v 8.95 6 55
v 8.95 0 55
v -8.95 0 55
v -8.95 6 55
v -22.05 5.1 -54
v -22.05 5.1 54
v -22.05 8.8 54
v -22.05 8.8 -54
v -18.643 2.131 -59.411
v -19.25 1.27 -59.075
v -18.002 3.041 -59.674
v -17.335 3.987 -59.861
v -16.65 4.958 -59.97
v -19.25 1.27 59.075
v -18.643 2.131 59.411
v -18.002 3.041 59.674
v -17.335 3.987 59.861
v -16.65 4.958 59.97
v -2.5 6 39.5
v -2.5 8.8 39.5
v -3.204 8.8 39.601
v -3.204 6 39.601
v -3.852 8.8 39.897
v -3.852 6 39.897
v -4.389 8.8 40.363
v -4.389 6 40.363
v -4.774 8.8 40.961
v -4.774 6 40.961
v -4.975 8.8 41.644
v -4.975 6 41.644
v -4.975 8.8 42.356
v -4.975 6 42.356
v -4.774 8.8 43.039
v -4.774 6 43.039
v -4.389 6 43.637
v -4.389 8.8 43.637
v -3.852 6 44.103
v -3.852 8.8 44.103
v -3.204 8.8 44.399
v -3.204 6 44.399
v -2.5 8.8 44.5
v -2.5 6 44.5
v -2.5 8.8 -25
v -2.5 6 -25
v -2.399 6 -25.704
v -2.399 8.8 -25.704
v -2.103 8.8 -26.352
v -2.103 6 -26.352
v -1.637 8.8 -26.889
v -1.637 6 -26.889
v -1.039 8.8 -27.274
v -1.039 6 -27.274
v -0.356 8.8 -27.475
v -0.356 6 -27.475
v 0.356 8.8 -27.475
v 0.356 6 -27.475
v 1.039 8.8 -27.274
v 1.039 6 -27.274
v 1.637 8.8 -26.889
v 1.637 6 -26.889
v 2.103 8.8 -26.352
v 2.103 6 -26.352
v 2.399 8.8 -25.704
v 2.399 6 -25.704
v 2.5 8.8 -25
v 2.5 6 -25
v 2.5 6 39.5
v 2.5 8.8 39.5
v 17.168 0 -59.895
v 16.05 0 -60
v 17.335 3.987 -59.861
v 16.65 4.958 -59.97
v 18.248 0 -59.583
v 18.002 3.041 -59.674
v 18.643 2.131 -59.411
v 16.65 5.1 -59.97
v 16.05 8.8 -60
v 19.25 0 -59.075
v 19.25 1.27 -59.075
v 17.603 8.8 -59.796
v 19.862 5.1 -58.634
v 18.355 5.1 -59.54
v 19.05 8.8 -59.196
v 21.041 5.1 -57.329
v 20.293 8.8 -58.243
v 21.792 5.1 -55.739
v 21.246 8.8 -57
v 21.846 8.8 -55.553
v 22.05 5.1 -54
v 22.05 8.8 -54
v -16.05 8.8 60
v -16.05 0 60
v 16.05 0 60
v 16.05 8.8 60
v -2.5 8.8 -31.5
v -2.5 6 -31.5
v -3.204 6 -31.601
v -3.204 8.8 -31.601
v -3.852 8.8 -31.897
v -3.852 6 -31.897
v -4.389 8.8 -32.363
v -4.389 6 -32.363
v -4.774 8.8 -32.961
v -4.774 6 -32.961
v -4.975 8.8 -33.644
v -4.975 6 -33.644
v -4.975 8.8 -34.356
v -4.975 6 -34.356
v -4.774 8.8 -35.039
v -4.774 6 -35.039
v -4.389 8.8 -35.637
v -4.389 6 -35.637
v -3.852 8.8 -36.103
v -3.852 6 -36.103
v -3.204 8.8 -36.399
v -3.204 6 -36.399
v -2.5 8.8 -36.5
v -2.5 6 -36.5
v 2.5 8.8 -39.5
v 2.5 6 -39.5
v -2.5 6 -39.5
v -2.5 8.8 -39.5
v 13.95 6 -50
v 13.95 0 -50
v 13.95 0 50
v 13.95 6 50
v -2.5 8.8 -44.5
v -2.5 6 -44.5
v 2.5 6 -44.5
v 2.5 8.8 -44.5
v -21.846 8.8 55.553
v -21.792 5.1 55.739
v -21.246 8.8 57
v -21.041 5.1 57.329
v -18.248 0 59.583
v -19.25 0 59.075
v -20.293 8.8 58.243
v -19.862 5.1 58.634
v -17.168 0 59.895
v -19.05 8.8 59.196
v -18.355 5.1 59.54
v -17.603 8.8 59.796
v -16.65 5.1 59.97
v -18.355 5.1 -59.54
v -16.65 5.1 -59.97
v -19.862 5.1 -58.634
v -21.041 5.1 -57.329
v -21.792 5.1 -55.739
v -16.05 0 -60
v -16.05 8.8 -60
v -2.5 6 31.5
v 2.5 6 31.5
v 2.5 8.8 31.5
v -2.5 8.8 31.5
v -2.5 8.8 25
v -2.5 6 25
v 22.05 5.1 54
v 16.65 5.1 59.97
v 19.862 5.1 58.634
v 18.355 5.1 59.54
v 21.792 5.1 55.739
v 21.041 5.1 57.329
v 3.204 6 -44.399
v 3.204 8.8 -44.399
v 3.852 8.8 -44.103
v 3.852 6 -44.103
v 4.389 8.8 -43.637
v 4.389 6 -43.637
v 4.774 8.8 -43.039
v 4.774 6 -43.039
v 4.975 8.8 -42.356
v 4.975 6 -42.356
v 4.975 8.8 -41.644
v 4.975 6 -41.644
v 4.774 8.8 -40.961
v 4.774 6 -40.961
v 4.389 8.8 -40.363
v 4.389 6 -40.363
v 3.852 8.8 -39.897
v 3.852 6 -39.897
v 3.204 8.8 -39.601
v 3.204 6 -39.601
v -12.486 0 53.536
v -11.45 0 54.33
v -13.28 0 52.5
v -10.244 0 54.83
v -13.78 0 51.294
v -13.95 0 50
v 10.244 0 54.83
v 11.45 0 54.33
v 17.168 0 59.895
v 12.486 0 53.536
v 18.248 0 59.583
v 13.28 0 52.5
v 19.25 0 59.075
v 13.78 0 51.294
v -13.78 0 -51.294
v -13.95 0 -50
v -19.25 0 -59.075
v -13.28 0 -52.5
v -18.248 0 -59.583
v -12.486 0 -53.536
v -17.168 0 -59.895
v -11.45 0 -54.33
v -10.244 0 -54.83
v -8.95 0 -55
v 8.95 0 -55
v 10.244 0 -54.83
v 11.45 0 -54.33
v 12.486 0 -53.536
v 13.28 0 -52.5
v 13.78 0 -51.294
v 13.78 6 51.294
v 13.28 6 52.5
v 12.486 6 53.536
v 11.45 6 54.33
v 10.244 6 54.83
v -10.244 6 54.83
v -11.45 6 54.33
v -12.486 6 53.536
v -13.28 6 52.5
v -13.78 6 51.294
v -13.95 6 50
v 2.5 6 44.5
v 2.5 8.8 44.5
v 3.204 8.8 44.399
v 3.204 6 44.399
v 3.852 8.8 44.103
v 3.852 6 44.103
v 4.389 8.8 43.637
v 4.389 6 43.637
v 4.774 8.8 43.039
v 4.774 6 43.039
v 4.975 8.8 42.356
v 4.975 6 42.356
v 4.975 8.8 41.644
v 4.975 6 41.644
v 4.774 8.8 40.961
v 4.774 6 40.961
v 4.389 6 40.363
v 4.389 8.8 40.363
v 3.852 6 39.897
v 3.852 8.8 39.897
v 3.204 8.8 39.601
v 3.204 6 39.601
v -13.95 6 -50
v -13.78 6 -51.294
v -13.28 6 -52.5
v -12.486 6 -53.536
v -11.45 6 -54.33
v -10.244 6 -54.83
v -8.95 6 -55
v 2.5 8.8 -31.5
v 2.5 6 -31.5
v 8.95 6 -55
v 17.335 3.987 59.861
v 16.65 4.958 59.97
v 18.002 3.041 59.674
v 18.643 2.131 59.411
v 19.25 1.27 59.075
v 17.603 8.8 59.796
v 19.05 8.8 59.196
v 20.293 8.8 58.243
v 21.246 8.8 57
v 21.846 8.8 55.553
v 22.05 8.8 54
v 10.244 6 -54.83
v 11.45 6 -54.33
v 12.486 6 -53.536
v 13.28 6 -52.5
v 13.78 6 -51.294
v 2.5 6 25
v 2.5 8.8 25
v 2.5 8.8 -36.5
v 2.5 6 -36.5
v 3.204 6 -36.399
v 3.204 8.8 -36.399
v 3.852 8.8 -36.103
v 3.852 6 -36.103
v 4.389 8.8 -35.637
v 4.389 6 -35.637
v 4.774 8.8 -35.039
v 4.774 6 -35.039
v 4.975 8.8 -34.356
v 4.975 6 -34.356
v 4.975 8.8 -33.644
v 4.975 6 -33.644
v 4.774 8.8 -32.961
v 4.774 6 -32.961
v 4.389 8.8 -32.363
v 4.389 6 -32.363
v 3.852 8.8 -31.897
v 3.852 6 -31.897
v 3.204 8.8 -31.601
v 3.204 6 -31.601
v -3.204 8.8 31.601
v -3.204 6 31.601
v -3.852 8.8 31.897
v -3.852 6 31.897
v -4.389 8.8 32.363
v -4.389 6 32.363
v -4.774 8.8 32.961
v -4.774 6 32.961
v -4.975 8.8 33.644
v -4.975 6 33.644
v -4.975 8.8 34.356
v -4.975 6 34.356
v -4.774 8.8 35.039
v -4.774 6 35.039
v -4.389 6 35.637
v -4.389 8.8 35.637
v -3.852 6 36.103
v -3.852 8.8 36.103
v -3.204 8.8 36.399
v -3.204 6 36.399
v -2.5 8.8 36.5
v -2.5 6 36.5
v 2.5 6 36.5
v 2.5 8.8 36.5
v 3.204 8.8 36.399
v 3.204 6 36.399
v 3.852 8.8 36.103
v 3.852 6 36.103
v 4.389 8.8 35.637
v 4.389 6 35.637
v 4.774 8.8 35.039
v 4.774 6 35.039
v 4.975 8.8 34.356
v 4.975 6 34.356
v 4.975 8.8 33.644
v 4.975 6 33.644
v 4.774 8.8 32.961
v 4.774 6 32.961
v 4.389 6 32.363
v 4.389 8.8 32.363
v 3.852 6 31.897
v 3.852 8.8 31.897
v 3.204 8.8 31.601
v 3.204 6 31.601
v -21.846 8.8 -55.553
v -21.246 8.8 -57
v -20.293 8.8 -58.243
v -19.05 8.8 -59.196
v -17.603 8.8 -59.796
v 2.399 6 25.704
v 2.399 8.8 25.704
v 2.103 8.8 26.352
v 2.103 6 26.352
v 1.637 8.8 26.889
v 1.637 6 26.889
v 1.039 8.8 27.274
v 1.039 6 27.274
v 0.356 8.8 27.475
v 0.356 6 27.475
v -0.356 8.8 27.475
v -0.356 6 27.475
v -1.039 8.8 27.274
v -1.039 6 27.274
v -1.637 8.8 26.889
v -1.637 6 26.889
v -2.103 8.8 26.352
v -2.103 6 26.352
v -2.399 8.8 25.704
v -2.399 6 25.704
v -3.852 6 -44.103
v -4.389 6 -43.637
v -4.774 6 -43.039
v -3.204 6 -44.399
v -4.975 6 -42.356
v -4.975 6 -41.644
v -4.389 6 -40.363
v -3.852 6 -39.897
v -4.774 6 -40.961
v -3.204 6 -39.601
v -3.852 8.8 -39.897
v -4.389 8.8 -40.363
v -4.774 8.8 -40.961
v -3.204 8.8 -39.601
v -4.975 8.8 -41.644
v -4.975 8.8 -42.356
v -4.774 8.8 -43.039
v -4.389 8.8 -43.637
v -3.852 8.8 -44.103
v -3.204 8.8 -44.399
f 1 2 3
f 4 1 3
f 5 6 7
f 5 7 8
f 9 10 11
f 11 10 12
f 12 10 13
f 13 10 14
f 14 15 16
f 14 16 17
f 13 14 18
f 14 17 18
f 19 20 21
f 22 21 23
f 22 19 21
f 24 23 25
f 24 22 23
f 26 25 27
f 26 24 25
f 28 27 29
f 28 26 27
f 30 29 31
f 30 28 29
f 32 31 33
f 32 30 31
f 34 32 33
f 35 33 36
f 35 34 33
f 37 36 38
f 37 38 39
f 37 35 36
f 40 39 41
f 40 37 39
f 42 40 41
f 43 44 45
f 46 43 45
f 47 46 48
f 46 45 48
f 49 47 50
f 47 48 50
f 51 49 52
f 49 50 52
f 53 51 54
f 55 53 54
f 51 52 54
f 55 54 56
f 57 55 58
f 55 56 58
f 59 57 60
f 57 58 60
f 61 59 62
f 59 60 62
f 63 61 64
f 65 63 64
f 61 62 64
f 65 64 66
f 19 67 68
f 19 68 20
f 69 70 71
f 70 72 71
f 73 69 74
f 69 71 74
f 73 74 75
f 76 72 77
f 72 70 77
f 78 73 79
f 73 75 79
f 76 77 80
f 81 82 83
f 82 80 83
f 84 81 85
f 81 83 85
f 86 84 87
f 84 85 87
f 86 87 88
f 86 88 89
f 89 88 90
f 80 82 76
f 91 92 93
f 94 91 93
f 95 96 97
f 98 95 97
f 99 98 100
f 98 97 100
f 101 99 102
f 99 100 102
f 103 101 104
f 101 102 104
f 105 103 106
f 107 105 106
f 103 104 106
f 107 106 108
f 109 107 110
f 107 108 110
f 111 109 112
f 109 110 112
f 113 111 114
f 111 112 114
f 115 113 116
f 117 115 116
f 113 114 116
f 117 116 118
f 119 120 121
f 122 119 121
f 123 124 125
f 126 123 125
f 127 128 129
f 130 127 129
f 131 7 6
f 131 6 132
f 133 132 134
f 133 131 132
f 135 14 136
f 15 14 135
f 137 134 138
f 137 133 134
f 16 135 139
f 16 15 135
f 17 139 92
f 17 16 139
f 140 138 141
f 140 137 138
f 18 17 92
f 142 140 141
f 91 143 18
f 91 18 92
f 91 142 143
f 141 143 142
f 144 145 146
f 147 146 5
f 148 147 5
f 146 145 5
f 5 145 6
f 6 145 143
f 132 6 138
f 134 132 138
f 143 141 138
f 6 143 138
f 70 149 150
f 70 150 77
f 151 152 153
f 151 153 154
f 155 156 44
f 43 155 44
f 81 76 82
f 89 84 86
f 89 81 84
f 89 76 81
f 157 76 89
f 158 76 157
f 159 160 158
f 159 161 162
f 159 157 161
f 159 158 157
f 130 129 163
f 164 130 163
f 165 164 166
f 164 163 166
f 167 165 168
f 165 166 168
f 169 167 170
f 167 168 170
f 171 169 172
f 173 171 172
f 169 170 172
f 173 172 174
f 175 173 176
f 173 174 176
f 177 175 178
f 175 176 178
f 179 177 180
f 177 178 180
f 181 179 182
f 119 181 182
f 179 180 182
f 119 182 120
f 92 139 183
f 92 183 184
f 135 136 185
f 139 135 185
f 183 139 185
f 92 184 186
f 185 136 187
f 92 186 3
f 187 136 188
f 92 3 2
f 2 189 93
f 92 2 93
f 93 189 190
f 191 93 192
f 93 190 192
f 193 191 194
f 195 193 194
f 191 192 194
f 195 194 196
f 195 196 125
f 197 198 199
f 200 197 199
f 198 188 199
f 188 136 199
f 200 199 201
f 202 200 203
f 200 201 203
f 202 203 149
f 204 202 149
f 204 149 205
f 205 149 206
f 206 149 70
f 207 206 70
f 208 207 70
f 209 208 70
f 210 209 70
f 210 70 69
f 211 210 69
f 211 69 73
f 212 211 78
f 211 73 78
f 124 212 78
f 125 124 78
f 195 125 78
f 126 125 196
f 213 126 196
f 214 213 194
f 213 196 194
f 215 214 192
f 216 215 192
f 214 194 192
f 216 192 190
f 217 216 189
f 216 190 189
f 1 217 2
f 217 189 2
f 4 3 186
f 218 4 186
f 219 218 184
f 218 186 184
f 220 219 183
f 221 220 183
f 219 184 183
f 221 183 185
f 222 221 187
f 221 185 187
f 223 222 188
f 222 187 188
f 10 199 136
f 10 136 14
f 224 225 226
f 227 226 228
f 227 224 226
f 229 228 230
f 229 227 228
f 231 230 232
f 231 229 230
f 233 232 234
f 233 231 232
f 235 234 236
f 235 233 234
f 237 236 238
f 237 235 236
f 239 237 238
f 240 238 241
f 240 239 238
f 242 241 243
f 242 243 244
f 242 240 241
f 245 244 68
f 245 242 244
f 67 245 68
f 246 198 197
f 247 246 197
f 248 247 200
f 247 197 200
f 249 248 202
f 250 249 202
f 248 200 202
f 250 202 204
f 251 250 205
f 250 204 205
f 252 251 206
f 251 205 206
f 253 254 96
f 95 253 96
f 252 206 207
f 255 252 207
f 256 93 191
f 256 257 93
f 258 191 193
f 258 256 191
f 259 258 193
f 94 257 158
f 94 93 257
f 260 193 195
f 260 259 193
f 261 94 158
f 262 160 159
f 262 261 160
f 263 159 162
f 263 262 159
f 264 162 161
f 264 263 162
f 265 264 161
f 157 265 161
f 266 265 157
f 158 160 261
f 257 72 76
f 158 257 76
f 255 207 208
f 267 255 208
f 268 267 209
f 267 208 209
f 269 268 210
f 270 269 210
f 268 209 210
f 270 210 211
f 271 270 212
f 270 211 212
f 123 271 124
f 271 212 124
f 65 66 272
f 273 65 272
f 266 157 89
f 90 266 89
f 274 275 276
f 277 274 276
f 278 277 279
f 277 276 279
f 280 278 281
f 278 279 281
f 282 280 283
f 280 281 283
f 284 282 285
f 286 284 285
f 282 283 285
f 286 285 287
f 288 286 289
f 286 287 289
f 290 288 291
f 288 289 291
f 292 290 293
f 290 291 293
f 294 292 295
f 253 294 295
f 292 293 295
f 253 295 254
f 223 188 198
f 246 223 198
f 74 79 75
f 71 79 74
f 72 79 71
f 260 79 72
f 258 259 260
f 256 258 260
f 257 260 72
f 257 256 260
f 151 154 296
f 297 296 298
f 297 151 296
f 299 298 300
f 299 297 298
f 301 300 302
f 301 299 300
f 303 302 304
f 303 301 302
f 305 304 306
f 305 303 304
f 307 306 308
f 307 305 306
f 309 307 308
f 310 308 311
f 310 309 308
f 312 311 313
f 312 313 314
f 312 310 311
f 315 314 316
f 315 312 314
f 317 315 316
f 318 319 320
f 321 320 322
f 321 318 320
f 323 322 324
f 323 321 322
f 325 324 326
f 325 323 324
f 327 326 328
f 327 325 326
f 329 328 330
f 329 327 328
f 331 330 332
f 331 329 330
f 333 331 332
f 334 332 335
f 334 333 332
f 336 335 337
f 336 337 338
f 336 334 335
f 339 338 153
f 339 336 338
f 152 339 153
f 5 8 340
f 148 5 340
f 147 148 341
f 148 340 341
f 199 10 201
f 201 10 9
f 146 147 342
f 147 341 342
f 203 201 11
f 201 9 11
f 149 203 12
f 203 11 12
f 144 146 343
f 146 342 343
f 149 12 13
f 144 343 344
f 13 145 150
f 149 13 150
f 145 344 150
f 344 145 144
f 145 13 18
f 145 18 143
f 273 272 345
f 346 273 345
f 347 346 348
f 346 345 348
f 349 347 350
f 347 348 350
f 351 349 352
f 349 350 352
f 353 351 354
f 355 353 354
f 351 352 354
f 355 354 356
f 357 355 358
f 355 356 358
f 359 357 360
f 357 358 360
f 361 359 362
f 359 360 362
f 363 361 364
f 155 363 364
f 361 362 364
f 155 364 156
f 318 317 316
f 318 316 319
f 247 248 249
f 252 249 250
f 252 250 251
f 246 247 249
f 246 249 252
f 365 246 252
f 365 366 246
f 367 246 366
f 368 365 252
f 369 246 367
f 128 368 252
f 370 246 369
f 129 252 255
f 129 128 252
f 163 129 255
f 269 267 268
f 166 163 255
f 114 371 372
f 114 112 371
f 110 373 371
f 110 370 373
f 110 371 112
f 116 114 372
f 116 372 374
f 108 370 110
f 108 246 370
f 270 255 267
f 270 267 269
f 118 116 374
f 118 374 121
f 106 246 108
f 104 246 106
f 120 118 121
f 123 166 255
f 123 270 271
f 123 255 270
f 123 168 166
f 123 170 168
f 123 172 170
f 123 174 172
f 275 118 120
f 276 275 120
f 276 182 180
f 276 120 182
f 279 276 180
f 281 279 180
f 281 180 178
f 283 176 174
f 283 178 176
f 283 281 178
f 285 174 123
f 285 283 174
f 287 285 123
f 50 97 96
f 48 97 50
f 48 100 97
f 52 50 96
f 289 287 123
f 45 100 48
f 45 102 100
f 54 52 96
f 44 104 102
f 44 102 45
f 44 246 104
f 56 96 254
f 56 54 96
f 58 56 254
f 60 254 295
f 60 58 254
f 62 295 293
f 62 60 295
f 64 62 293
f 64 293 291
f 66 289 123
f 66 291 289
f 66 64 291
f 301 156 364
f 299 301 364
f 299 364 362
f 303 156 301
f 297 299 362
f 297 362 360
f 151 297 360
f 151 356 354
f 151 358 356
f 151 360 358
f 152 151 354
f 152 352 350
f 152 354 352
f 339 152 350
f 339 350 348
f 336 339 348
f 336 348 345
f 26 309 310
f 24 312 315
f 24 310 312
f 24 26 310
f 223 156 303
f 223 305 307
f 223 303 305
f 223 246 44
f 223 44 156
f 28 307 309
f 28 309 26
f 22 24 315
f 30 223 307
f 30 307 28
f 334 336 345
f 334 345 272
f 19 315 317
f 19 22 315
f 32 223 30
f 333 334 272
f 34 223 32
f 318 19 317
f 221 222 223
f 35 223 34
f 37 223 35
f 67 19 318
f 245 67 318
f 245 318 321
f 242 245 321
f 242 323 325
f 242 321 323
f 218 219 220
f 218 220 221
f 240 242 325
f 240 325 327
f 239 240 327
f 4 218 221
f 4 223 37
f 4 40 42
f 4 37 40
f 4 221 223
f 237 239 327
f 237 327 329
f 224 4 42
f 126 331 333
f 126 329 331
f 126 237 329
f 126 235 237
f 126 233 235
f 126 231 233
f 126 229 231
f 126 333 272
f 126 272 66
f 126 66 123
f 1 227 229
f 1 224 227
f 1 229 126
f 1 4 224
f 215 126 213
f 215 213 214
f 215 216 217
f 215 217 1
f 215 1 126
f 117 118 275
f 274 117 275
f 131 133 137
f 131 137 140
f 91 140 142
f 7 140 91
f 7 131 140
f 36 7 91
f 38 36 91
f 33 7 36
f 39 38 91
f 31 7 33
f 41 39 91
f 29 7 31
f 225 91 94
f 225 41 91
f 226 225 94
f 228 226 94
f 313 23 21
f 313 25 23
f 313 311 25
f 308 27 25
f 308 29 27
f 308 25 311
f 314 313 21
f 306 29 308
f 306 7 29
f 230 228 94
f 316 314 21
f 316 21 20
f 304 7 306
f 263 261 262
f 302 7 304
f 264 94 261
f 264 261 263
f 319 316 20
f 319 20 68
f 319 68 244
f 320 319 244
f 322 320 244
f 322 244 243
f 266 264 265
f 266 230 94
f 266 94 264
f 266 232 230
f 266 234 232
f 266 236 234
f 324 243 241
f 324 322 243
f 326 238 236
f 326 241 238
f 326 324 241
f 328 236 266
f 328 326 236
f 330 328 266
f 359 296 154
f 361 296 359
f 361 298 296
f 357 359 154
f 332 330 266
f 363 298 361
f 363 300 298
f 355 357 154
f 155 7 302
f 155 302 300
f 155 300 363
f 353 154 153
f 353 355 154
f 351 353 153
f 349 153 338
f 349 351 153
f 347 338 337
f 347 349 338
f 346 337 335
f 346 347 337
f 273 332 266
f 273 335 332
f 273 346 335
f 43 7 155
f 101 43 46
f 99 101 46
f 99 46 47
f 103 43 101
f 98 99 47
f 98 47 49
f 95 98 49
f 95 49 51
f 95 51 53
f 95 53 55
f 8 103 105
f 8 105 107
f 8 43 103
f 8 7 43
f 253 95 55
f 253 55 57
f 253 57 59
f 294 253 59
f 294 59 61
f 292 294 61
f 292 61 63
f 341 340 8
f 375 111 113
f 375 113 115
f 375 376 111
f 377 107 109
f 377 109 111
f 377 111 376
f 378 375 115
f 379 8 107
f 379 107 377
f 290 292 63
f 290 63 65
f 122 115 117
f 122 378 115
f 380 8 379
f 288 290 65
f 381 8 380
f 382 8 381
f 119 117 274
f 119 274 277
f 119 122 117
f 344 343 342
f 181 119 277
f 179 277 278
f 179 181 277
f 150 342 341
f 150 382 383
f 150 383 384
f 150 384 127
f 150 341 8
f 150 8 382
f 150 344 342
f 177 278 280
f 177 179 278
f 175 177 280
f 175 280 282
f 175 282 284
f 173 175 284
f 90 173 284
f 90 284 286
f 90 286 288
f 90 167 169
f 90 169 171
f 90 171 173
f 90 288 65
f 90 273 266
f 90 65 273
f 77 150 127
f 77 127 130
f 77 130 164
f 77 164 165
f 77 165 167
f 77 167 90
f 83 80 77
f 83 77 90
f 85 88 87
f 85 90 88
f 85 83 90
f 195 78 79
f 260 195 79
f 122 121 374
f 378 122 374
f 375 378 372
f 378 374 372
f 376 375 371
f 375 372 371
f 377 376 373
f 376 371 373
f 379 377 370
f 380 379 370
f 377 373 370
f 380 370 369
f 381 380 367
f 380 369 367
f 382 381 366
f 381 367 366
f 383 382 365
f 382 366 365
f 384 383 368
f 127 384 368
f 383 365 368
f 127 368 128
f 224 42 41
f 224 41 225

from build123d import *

# Parameters (mm, degrees)
SKETCH1_W           = 44.1
SKETCH1_H           = 120
BOSS_EXTRUDE1_DEPTH = 8.8
FILLET1_R           = 6
CUT_EXTRUDE1_DEPTH  = 121
CUT_EXTRUDE2_DEPTH  = 6


with BuildPart() as part:
    # Sketch1 → Boss-Extrude1 (new body)
    with BuildSketch(Plane(origin=(0, 0, 0), x_dir=(1, 0, 0), z_dir=(0, 1, 0))):
        Rectangle(SKETCH1_W, SKETCH1_H)
        with BuildLine():
            Line((-2.5, -25), (-2.5, 25))
            ThreePointArc((-2.5, 25), (0, 27.5), (2.5, 25))
            Line((2.5, 25), (2.5, -25))
            ThreePointArc((2.5, -25), (0, -27.5), (-2.5, -25))
        make_face(mode=Mode.SUBTRACT)
        with BuildLine():
            Line((-2.5, 36.5), (2.5, 36.5))
            ThreePointArc((2.5, 36.5), (5, 34), (2.5, 31.5))
            Line((2.5, 31.5), (-2.5, 31.5))
            ThreePointArc((-2.5, 31.5), (-5, 34), (-2.5, 36.5))
        make_face(mode=Mode.SUBTRACT)
        with BuildLine():
            Line((-2.5, 44.5), (2.5, 44.5))
            ThreePointArc((2.5, 44.5), (5, 42), (2.5, 39.5))
            Line((2.5, 39.5), (-2.5, 39.5))
            ThreePointArc((-2.5, 39.5), (-5, 42), (-2.5, 44.5))
        make_face(mode=Mode.SUBTRACT)
        with BuildLine():
            Line((-2.5, -44.5), (2.5, -44.5))
            ThreePointArc((2.5, -44.5), (5, -42), (2.5, -39.5))
            Line((2.5, -39.5), (-2.5, -39.5))
            ThreePointArc((-2.5, -39.5), (-5, -42), (-2.5, -44.5))
        make_face(mode=Mode.SUBTRACT)
        with BuildLine():
            Line((-2.5, -36.5), (2.5, -36.5))
            ThreePointArc((2.5, -36.5), (5, -34), (2.5, -31.5))
            Line((2.5, -31.5), (-2.5, -31.5))
            ThreePointArc((-2.5, -31.5), (-5, -34), (-2.5, -36.5))
        make_face(mode=Mode.SUBTRACT)
    extrude(amount=BOSS_EXTRUDE1_DEPTH)

    # Fillet1
    fillet1_edges = [part.edges().sort_by_distance(p)[0] for p in [
        (22.05, 4.4, 60),
        (-22.05, 4.4, 60),
        (-22.05, 4.4, -60),
        (22.05, 4.4, -60),
    ]]
    fillet(fillet1_edges, radius=FILLET1_R)

    # Sketch2 → Cut-Extrude1 (cut, through all)
    with BuildSketch(Plane.XY.offset(60)):
        Polygon((19.25, 0), (19.25, 1.270336268), (16.65, 4.958404732), (16.65, 5.1), (22.05, 5.1), (22.05, 0), align=None)
        Polygon((-22.05, 0), (-19.25, 0), (-19.25, 1.270336268), (-16.65, 4.958404732), (-16.65, 5.1), (-22.05, 5.1), align=None)
    extrude(amount=-CUT_EXTRUDE1_DEPTH, mode=Mode.SUBTRACT)

    # Sketch3 → Cut-Extrude2 (cut)
    with BuildSketch(Plane.XZ):
        with BuildLine():
            Line((-8.95, -55), (8.95, -55))
            ThreePointArc((8.95, -55), (12.485533906, -53.535533906), (13.95, -50))
            Line((13.95, -50), (13.95, 50))
            ThreePointArc((13.95, 50), (12.485533906, 53.535533906), (8.95, 55))
            Line((8.95, 55), (-8.95, 55))
            ThreePointArc((-8.95, 55), (-12.485533906, 53.535533906), (-13.95, 50))
            Line((-13.95, 50), (-13.95, -50))
            ThreePointArc((-13.95, -50), (-12.485533906, -53.535533906), (-8.95, -55))
        make_face()
    extrude(amount=-CUT_EXTRUDE2_DEPTH, mode=Mode.SUBTRACT)


solid = part.part
